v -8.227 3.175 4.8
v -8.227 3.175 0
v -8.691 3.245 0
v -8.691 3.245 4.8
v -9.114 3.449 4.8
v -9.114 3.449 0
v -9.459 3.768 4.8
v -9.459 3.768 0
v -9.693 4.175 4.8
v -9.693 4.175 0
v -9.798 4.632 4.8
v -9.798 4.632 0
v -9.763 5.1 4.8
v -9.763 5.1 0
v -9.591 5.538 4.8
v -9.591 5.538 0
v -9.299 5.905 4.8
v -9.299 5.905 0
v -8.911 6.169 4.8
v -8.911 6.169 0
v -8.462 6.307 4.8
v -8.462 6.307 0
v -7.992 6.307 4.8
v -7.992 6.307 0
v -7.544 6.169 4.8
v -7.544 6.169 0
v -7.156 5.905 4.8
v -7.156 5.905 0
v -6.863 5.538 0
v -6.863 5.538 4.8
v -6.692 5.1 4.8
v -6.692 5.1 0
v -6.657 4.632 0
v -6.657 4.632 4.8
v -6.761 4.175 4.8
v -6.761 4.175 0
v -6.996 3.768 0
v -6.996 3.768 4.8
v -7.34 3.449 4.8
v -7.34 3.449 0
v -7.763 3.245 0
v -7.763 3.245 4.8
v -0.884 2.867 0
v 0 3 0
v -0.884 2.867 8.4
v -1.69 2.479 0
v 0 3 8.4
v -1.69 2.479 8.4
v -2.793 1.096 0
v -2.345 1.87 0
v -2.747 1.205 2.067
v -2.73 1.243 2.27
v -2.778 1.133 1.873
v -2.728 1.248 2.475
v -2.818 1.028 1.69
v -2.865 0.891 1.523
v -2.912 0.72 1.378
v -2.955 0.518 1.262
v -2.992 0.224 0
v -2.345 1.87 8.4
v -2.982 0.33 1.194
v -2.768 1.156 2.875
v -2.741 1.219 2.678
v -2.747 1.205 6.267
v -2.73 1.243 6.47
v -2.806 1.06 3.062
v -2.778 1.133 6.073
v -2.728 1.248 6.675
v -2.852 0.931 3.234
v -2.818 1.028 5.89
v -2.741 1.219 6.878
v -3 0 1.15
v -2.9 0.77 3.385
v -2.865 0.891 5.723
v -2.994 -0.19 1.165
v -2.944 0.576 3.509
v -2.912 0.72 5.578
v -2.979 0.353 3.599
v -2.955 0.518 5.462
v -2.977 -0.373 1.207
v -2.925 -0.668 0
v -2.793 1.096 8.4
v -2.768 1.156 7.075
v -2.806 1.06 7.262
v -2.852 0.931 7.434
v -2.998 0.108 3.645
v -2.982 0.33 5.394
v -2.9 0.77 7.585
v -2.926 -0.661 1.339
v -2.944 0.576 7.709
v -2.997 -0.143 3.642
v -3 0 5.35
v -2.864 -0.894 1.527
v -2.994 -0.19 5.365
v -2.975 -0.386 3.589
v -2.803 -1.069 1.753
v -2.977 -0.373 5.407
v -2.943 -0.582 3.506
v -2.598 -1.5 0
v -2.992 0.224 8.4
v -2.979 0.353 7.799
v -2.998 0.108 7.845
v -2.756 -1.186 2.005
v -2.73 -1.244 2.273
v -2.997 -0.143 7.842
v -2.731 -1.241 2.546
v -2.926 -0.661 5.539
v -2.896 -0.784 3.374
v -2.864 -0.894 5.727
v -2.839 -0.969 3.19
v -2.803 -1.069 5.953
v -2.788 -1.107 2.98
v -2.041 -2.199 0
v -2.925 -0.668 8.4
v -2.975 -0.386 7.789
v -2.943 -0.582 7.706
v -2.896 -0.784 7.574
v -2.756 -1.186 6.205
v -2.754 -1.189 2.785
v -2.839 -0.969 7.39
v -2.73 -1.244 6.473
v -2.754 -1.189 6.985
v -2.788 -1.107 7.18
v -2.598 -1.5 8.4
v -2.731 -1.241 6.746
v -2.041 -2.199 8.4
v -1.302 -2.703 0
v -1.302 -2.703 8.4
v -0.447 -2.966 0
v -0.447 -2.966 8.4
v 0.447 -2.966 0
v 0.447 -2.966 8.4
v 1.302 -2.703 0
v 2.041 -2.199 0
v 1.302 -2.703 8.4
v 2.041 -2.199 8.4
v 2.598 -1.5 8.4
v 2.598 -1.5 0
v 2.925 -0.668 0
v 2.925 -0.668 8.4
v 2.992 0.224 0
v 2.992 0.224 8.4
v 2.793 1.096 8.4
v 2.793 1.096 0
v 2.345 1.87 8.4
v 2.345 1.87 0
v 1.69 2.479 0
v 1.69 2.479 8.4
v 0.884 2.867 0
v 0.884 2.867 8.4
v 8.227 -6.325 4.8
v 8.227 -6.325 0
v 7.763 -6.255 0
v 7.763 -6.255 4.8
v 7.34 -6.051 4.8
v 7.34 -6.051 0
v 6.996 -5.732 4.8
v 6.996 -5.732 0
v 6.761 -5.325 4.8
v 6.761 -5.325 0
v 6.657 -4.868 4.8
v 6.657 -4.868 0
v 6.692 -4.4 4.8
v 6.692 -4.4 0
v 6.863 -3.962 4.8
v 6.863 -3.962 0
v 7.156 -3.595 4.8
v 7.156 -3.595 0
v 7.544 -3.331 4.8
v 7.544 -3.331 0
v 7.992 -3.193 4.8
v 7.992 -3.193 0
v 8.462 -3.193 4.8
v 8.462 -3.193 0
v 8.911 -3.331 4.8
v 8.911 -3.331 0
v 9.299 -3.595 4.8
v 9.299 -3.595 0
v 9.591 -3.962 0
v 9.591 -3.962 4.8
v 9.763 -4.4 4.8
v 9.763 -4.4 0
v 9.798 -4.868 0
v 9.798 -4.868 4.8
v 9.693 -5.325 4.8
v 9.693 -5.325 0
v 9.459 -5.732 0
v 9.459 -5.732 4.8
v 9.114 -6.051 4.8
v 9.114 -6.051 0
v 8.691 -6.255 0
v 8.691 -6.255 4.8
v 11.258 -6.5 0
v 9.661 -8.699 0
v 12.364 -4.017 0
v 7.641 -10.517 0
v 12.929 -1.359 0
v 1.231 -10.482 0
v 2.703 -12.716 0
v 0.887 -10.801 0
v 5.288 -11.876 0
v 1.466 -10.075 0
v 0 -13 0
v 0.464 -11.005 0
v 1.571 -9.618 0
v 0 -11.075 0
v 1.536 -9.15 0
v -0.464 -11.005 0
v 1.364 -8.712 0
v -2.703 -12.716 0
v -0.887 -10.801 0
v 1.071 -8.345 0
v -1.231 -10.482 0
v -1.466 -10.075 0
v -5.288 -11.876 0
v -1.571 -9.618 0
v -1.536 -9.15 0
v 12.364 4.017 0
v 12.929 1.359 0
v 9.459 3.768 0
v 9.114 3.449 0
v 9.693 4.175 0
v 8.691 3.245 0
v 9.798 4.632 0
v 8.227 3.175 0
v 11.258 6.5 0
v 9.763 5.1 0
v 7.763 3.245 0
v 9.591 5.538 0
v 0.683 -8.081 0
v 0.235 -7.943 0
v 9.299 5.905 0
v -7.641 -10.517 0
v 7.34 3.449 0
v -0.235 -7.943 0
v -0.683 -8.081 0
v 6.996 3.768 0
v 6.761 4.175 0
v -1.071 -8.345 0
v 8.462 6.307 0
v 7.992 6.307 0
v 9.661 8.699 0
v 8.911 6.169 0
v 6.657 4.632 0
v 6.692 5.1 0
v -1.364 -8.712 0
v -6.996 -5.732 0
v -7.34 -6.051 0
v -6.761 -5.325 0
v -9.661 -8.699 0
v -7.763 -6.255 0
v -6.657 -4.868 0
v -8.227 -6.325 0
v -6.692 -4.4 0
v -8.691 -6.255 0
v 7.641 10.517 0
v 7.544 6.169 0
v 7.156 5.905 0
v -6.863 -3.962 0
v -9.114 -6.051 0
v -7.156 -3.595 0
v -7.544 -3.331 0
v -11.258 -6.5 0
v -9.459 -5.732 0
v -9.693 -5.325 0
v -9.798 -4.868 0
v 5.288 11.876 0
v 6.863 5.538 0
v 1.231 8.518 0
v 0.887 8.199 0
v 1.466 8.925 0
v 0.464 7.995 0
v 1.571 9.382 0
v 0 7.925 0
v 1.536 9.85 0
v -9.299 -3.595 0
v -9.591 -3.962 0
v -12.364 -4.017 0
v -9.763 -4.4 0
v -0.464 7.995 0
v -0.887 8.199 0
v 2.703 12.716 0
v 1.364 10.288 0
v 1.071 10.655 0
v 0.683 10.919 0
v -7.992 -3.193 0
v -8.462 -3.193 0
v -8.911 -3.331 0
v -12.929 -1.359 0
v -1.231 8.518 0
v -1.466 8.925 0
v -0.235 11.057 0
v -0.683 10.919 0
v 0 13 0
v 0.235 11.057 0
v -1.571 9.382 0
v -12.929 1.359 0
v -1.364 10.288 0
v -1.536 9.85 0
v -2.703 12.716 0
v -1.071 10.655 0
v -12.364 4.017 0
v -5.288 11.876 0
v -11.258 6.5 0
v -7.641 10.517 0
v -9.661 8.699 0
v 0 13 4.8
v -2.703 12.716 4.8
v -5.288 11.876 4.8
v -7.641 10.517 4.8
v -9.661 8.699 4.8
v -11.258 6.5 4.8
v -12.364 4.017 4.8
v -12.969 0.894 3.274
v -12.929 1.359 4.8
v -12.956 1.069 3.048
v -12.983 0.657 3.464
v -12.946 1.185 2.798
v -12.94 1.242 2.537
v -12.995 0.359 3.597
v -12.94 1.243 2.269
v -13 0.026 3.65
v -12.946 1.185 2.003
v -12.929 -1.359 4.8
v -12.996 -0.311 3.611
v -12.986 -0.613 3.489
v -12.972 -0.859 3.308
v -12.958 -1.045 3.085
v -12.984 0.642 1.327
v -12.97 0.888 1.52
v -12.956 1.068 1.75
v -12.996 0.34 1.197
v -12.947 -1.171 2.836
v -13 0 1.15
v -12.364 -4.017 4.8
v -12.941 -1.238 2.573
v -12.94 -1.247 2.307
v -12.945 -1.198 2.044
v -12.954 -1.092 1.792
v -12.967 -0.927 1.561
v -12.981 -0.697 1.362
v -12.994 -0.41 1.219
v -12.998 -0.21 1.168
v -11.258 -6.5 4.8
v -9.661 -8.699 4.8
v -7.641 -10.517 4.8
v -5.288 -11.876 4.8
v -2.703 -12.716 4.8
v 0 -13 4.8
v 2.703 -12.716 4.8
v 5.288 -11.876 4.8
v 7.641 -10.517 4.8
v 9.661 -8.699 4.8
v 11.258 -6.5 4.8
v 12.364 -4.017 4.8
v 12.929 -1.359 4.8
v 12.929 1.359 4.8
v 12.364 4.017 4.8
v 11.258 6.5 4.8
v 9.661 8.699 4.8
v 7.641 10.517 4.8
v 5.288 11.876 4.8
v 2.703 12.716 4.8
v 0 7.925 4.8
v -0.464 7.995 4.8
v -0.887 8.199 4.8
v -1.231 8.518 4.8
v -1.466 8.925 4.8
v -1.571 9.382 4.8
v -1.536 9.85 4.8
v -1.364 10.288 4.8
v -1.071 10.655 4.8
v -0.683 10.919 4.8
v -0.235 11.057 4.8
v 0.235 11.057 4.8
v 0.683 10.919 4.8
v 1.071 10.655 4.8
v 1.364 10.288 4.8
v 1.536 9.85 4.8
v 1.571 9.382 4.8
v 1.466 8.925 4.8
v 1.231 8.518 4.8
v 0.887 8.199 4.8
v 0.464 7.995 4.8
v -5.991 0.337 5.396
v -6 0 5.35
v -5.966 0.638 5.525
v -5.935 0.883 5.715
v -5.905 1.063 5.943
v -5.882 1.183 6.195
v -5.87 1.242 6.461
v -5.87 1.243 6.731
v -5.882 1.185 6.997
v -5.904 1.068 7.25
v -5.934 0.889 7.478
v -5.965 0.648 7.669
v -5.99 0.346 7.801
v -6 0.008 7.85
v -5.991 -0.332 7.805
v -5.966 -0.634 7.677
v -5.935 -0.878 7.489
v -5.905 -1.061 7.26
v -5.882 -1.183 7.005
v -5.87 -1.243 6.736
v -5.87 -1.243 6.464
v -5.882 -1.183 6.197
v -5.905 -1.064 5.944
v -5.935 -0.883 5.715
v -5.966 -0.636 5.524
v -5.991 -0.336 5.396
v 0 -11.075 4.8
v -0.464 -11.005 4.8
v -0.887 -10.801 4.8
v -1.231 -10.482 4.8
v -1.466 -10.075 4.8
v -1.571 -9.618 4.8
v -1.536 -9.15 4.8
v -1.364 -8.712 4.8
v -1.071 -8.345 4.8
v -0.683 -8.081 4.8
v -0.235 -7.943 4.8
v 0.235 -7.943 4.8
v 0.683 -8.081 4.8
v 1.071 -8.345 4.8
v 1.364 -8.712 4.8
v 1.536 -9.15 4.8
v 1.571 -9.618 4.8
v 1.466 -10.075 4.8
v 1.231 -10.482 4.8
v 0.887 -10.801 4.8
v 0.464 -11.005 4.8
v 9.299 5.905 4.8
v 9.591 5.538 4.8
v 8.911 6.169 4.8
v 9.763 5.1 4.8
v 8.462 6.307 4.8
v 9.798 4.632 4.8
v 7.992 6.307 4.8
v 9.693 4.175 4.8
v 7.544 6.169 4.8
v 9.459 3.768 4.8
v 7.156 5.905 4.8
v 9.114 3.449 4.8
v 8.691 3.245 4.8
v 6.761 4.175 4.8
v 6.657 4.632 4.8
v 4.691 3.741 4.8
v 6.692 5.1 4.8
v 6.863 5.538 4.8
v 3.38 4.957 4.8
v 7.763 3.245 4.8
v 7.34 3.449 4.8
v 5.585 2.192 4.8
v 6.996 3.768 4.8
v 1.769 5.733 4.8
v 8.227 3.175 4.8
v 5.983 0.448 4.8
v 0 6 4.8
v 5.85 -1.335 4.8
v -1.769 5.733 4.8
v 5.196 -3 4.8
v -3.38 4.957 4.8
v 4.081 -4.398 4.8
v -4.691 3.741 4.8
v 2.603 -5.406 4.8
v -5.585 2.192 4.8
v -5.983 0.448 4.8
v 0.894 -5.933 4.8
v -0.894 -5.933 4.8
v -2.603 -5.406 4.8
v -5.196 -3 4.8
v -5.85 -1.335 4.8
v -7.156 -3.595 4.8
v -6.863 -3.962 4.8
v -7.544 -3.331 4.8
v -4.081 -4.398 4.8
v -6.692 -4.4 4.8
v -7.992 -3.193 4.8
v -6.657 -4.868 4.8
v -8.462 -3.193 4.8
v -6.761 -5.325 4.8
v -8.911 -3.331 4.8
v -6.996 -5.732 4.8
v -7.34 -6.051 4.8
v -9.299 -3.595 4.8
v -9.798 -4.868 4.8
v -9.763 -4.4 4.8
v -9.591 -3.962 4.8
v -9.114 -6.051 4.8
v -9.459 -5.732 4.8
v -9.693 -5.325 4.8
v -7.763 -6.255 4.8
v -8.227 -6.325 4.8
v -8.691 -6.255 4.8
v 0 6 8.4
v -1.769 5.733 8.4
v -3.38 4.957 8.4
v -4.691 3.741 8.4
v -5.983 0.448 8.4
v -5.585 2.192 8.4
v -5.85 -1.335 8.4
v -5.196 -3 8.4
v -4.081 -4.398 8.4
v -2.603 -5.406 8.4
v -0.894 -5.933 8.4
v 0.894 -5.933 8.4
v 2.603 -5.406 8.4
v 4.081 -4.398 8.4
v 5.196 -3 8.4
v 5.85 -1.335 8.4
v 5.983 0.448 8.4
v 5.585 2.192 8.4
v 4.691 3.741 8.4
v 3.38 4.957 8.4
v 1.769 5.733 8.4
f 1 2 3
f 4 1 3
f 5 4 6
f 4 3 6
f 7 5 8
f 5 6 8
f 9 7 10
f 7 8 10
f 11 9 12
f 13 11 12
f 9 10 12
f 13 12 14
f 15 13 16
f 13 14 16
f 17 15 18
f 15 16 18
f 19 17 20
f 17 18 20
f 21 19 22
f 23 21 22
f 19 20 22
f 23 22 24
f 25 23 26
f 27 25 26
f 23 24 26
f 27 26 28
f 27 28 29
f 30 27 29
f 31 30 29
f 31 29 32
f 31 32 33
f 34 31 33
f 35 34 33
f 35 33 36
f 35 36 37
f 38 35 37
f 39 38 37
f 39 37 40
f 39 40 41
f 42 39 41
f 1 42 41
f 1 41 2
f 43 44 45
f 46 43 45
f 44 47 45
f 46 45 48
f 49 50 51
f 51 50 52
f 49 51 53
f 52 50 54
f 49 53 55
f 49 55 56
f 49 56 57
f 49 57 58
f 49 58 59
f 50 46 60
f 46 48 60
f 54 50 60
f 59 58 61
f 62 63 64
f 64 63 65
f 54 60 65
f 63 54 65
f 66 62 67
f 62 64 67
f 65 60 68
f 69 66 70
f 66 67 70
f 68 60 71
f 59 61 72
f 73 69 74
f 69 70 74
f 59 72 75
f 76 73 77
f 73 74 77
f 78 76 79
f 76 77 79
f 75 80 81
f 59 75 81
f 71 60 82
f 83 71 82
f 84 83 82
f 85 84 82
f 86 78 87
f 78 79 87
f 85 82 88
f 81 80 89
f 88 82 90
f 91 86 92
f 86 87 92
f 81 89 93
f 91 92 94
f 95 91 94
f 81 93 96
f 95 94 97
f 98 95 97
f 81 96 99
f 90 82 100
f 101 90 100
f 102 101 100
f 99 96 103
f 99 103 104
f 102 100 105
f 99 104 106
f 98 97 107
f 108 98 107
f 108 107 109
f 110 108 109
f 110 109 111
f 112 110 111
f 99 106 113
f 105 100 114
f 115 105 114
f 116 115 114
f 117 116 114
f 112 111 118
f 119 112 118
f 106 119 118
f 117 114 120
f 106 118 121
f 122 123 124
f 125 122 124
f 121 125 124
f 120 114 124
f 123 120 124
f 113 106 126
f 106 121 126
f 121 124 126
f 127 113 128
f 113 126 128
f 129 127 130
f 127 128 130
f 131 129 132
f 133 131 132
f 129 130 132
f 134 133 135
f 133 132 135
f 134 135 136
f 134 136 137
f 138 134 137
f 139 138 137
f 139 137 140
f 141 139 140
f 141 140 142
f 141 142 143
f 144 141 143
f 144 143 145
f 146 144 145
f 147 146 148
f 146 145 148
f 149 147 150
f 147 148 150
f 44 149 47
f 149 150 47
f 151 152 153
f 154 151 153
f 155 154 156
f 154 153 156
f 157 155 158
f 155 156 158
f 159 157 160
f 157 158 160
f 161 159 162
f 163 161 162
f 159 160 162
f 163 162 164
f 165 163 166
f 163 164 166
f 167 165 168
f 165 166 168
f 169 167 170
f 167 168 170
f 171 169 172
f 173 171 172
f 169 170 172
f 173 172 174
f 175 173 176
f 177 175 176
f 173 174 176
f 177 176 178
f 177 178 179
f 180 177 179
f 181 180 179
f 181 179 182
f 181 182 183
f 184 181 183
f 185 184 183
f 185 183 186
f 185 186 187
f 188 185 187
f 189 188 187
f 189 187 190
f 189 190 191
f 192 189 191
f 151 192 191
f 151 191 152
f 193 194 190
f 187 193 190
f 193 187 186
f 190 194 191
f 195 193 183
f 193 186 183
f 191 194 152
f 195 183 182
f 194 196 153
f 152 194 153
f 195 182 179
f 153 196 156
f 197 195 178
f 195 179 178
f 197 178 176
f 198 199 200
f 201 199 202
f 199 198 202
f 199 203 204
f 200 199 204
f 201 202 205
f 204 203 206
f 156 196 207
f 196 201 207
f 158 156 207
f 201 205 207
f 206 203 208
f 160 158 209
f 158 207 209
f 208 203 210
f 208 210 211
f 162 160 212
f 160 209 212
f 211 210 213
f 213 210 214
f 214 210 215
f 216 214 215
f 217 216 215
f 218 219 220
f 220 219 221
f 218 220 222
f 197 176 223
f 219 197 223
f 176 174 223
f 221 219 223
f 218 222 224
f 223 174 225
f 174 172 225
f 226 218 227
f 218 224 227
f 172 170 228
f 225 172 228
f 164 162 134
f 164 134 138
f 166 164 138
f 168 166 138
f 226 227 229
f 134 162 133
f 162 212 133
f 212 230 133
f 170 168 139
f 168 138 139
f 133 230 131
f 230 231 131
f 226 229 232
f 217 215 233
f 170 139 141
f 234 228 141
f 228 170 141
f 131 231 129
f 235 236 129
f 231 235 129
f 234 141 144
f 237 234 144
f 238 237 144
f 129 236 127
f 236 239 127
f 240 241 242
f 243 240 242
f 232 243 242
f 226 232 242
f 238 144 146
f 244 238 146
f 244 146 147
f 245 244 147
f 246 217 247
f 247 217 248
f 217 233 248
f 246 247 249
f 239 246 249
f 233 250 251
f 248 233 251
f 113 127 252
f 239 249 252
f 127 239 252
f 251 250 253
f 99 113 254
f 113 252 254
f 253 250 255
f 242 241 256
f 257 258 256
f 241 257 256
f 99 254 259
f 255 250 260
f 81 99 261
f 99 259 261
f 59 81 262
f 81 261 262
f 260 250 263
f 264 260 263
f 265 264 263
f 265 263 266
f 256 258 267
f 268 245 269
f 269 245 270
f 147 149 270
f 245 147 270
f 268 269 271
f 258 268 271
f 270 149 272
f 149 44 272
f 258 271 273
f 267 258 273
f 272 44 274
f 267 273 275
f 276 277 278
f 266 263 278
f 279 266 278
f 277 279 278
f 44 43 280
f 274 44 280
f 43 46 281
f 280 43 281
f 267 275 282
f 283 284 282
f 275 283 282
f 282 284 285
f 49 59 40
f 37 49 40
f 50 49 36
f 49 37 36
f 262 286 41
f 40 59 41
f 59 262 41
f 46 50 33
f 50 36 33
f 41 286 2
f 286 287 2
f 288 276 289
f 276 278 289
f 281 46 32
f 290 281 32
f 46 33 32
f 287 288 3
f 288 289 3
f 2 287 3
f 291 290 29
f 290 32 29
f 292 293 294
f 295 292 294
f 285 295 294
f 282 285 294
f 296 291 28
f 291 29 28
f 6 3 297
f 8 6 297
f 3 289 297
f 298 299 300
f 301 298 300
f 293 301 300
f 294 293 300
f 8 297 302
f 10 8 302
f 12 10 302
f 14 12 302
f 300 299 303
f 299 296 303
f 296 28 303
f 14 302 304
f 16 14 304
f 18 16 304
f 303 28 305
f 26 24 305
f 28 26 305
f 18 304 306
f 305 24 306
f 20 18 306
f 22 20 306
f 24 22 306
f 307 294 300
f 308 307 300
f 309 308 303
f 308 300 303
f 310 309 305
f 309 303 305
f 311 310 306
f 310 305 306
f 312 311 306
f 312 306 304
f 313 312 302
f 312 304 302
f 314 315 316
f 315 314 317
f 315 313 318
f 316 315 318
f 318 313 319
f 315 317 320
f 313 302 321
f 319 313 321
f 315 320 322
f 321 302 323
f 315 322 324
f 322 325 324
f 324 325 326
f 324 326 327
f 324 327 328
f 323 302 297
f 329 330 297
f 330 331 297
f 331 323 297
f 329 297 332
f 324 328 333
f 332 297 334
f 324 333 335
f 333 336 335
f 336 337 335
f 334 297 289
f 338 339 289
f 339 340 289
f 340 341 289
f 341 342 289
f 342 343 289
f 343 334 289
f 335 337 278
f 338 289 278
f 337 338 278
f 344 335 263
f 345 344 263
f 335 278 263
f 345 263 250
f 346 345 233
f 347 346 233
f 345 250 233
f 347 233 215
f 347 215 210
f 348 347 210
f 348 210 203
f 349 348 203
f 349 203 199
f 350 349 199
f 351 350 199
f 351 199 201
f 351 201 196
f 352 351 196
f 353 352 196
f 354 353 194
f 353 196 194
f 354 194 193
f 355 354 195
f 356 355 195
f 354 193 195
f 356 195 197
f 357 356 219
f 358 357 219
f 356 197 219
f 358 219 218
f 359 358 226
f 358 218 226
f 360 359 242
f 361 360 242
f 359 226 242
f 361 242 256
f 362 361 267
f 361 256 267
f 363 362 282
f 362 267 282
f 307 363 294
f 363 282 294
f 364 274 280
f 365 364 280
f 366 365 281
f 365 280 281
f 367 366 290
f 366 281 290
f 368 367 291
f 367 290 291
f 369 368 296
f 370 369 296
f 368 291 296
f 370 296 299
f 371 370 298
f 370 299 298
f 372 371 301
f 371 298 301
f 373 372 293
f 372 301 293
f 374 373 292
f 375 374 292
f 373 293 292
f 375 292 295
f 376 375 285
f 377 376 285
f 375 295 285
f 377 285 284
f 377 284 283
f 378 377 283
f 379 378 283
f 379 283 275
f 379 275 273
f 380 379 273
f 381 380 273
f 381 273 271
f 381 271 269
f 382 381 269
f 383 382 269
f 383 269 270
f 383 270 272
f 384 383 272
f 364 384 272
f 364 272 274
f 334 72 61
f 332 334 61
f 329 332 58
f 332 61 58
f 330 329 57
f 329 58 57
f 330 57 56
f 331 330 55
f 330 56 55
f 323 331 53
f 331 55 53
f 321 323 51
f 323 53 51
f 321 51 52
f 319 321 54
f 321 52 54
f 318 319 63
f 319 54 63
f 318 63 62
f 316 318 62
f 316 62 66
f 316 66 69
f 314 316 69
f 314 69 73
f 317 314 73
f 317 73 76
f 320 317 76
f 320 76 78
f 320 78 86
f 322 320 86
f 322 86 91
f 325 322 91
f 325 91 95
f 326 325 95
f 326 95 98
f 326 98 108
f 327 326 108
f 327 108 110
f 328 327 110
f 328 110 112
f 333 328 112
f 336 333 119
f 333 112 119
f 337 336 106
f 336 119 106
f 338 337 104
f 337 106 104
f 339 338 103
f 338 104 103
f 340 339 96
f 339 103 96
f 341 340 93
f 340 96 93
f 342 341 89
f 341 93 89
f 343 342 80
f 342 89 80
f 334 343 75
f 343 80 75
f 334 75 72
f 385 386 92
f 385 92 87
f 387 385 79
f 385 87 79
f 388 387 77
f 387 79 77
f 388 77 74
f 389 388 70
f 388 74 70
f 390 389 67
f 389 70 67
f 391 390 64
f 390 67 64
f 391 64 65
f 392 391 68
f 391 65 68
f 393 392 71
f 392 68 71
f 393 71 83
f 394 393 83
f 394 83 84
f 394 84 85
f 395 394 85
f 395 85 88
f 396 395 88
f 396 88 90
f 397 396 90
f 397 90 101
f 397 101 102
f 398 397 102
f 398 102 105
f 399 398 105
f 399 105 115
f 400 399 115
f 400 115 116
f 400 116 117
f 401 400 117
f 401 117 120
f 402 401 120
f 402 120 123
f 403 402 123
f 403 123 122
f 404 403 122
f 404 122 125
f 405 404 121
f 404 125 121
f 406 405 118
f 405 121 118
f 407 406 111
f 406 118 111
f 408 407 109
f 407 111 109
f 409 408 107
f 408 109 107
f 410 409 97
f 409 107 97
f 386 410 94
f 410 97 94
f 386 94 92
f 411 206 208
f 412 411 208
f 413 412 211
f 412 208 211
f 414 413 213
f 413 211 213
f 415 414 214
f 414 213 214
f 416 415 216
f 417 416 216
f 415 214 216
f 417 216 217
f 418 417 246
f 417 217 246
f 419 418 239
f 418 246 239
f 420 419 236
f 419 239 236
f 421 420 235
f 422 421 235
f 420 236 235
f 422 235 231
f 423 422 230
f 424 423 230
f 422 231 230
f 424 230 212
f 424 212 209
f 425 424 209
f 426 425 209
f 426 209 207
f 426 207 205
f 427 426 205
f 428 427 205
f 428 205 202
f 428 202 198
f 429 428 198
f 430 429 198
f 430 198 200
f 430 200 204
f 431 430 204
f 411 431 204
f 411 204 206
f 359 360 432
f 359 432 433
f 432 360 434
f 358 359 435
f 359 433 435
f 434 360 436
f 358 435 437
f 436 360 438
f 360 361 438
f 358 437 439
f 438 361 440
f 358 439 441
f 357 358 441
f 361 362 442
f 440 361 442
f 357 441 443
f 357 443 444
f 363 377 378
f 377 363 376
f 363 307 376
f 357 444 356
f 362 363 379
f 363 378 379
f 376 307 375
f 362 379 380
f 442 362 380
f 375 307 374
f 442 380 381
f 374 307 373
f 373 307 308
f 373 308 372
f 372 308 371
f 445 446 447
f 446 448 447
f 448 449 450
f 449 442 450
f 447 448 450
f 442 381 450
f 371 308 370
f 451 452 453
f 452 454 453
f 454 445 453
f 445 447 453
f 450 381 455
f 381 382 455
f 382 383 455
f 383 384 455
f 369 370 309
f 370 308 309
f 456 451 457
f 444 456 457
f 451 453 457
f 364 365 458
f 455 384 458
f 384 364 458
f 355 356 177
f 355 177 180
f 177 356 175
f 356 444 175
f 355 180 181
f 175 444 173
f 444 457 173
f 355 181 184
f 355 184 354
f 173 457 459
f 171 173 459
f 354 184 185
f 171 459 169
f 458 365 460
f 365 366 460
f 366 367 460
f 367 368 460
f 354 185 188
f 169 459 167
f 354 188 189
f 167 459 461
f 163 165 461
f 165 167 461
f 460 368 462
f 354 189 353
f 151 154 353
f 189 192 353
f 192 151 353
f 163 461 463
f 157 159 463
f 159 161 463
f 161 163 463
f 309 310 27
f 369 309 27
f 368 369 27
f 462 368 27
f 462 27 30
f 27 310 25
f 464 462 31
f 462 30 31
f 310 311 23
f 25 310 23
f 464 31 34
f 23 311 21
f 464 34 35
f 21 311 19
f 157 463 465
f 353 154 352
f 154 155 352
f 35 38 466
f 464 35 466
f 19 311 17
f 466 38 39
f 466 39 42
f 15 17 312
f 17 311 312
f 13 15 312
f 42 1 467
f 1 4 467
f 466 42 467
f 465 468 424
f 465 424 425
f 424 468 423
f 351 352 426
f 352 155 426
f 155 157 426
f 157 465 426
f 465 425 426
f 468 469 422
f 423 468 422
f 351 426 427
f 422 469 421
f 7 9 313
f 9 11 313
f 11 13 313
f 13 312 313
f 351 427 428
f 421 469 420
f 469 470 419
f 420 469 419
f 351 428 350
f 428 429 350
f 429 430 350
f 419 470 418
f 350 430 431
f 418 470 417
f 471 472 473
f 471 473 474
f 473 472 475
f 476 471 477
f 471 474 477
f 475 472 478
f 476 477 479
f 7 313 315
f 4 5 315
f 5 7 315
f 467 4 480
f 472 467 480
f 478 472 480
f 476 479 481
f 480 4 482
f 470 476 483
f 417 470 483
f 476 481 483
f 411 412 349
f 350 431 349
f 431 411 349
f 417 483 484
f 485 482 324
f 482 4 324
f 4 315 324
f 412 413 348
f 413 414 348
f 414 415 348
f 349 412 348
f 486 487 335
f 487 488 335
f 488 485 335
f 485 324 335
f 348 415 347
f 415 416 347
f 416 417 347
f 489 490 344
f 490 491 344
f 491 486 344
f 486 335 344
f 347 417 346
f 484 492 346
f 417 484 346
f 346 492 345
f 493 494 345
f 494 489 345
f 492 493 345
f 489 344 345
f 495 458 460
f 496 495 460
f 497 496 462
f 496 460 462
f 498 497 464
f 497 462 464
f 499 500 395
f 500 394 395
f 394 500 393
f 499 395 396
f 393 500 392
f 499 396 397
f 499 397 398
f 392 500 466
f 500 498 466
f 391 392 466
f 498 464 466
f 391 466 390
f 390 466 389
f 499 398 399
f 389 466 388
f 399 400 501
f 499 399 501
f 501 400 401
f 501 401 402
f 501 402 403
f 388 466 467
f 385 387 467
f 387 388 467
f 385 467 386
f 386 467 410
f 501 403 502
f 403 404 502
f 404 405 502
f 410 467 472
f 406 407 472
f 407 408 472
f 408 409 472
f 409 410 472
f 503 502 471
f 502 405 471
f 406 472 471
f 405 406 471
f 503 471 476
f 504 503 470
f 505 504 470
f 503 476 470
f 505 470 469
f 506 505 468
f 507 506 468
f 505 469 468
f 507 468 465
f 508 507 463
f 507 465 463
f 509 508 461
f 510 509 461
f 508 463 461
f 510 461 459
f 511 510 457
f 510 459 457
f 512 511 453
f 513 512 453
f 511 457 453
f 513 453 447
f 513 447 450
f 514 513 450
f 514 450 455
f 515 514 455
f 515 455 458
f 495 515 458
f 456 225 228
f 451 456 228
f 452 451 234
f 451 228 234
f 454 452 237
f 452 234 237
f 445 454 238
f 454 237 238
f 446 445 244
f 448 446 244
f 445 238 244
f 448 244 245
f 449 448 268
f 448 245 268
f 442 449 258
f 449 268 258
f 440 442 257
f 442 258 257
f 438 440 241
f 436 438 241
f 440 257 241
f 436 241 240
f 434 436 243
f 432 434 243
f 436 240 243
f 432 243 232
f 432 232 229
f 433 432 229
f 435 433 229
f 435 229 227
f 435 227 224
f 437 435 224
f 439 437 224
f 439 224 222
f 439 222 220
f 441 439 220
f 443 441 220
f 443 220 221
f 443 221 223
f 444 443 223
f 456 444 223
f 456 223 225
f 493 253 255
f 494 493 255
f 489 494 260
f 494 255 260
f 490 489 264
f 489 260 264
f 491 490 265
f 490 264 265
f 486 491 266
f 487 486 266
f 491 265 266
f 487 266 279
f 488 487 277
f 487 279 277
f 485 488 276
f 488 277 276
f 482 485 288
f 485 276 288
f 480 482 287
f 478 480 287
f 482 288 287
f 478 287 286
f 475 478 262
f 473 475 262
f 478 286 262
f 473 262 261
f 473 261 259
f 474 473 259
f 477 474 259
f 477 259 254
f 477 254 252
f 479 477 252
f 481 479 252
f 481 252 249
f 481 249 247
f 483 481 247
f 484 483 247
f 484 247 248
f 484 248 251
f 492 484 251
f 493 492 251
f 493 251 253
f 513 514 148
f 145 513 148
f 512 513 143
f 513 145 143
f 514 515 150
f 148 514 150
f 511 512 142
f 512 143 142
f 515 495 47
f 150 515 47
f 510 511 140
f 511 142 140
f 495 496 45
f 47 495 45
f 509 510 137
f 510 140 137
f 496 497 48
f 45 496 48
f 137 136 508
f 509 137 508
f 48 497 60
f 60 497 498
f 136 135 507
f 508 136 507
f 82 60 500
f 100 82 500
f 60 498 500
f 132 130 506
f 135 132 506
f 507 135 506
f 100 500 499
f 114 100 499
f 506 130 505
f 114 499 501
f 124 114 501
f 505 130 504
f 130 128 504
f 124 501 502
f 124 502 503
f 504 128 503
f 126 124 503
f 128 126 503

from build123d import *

# Parameters (mm, degrees)
TAP_DRILL_FOR_M3_HELICOIL1_D     = 3.15
TAP_DRILL_FOR_M3_HELICOIL1_DEPTH = 10
TAP_DRILL_FOR_M3_HELICOIL1_TIP   = 0.946355475
CUT_EXTRUDE3_REACH               = 22.213
SKETCH2_R                        = 1.25


with BuildPart() as part:
    # Sketch1 → Revolve1 (revolve)
    with BuildSketch(Plane(origin=(0, 0, 0), x_dir=(0, 0, -1), z_dir=(1, 0, 0))):
        Polygon((0, 3), (-8.4, 3), (-8.4, 6), (-4.8, 6), (-4.8, 13), (0, 13), align=None)
    revolve(axis=Axis((0, 0, 6.17319531), (0, 0, 1)))

    # Tap Drill for M3 Helicoil1
    with Locations(Plane(origin=(0, -9.5, 4.8), x_dir=(0, 1, 0), z_dir=(0, 0, 1))):
        with Locations((0, 0), (4.75, -8.227241336), (14.25, -8.227241336), (19, 0), (14.25, 8.227241336), (4.75, 8.227241336)):
            Hole(TAP_DRILL_FOR_M3_HELICOIL1_D / 2, depth=TAP_DRILL_FOR_M3_HELICOIL1_DEPTH)
            with Locations((0, 0, -(TAP_DRILL_FOR_M3_HELICOIL1_DEPTH + TAP_DRILL_FOR_M3_HELICOIL1_TIP / 2))):  # 118° drill point
                Cone(0, TAP_DRILL_FOR_M3_HELICOIL1_D / 2, TAP_DRILL_FOR_M3_HELICOIL1_TIP, mode=Mode.SUBTRACT)

    # Sketch2 → Cut-Extrude3 (cut, up to next)
    with BuildSketch(Plane(origin=(0, 0, 0), x_dir=(0, 0, -1), z_dir=(1, 0, 0)), mode=Mode.PRIVATE) as cut_extrude3_sk1:
        with Locations((-2.4, 0)):
            Circle(SKETCH2_R)
    cut_extrude3_tool1 = extrude(cut_extrude3_sk1.sketch, amount=-CUT_EXTRUDE3_REACH, mode=Mode.PRIVATE) & part.part
    # Sketch2 → Cut-Extrude3 (cut, up to next)
    with BuildSketch(Plane(origin=(0, 0, 0), x_dir=(0, 0, -1), z_dir=(1, 0, 0)), mode=Mode.PRIVATE) as cut_extrude3_sk2:
        with Locations((-6.6, 0)):
            Circle(SKETCH2_R)
    cut_extrude3_tool2 = extrude(cut_extrude3_sk2.sketch, amount=-CUT_EXTRUDE3_REACH, mode=Mode.PRIVATE) & part.part
    add(cut_extrude3_tool1.solids().sort_by_distance((0, 0, 2.4))[0], mode=Mode.SUBTRACT)
    add(cut_extrude3_tool2.solids().sort_by_distance((0, 0, 6.6))[0], mode=Mode.SUBTRACT)


solid = part.part
